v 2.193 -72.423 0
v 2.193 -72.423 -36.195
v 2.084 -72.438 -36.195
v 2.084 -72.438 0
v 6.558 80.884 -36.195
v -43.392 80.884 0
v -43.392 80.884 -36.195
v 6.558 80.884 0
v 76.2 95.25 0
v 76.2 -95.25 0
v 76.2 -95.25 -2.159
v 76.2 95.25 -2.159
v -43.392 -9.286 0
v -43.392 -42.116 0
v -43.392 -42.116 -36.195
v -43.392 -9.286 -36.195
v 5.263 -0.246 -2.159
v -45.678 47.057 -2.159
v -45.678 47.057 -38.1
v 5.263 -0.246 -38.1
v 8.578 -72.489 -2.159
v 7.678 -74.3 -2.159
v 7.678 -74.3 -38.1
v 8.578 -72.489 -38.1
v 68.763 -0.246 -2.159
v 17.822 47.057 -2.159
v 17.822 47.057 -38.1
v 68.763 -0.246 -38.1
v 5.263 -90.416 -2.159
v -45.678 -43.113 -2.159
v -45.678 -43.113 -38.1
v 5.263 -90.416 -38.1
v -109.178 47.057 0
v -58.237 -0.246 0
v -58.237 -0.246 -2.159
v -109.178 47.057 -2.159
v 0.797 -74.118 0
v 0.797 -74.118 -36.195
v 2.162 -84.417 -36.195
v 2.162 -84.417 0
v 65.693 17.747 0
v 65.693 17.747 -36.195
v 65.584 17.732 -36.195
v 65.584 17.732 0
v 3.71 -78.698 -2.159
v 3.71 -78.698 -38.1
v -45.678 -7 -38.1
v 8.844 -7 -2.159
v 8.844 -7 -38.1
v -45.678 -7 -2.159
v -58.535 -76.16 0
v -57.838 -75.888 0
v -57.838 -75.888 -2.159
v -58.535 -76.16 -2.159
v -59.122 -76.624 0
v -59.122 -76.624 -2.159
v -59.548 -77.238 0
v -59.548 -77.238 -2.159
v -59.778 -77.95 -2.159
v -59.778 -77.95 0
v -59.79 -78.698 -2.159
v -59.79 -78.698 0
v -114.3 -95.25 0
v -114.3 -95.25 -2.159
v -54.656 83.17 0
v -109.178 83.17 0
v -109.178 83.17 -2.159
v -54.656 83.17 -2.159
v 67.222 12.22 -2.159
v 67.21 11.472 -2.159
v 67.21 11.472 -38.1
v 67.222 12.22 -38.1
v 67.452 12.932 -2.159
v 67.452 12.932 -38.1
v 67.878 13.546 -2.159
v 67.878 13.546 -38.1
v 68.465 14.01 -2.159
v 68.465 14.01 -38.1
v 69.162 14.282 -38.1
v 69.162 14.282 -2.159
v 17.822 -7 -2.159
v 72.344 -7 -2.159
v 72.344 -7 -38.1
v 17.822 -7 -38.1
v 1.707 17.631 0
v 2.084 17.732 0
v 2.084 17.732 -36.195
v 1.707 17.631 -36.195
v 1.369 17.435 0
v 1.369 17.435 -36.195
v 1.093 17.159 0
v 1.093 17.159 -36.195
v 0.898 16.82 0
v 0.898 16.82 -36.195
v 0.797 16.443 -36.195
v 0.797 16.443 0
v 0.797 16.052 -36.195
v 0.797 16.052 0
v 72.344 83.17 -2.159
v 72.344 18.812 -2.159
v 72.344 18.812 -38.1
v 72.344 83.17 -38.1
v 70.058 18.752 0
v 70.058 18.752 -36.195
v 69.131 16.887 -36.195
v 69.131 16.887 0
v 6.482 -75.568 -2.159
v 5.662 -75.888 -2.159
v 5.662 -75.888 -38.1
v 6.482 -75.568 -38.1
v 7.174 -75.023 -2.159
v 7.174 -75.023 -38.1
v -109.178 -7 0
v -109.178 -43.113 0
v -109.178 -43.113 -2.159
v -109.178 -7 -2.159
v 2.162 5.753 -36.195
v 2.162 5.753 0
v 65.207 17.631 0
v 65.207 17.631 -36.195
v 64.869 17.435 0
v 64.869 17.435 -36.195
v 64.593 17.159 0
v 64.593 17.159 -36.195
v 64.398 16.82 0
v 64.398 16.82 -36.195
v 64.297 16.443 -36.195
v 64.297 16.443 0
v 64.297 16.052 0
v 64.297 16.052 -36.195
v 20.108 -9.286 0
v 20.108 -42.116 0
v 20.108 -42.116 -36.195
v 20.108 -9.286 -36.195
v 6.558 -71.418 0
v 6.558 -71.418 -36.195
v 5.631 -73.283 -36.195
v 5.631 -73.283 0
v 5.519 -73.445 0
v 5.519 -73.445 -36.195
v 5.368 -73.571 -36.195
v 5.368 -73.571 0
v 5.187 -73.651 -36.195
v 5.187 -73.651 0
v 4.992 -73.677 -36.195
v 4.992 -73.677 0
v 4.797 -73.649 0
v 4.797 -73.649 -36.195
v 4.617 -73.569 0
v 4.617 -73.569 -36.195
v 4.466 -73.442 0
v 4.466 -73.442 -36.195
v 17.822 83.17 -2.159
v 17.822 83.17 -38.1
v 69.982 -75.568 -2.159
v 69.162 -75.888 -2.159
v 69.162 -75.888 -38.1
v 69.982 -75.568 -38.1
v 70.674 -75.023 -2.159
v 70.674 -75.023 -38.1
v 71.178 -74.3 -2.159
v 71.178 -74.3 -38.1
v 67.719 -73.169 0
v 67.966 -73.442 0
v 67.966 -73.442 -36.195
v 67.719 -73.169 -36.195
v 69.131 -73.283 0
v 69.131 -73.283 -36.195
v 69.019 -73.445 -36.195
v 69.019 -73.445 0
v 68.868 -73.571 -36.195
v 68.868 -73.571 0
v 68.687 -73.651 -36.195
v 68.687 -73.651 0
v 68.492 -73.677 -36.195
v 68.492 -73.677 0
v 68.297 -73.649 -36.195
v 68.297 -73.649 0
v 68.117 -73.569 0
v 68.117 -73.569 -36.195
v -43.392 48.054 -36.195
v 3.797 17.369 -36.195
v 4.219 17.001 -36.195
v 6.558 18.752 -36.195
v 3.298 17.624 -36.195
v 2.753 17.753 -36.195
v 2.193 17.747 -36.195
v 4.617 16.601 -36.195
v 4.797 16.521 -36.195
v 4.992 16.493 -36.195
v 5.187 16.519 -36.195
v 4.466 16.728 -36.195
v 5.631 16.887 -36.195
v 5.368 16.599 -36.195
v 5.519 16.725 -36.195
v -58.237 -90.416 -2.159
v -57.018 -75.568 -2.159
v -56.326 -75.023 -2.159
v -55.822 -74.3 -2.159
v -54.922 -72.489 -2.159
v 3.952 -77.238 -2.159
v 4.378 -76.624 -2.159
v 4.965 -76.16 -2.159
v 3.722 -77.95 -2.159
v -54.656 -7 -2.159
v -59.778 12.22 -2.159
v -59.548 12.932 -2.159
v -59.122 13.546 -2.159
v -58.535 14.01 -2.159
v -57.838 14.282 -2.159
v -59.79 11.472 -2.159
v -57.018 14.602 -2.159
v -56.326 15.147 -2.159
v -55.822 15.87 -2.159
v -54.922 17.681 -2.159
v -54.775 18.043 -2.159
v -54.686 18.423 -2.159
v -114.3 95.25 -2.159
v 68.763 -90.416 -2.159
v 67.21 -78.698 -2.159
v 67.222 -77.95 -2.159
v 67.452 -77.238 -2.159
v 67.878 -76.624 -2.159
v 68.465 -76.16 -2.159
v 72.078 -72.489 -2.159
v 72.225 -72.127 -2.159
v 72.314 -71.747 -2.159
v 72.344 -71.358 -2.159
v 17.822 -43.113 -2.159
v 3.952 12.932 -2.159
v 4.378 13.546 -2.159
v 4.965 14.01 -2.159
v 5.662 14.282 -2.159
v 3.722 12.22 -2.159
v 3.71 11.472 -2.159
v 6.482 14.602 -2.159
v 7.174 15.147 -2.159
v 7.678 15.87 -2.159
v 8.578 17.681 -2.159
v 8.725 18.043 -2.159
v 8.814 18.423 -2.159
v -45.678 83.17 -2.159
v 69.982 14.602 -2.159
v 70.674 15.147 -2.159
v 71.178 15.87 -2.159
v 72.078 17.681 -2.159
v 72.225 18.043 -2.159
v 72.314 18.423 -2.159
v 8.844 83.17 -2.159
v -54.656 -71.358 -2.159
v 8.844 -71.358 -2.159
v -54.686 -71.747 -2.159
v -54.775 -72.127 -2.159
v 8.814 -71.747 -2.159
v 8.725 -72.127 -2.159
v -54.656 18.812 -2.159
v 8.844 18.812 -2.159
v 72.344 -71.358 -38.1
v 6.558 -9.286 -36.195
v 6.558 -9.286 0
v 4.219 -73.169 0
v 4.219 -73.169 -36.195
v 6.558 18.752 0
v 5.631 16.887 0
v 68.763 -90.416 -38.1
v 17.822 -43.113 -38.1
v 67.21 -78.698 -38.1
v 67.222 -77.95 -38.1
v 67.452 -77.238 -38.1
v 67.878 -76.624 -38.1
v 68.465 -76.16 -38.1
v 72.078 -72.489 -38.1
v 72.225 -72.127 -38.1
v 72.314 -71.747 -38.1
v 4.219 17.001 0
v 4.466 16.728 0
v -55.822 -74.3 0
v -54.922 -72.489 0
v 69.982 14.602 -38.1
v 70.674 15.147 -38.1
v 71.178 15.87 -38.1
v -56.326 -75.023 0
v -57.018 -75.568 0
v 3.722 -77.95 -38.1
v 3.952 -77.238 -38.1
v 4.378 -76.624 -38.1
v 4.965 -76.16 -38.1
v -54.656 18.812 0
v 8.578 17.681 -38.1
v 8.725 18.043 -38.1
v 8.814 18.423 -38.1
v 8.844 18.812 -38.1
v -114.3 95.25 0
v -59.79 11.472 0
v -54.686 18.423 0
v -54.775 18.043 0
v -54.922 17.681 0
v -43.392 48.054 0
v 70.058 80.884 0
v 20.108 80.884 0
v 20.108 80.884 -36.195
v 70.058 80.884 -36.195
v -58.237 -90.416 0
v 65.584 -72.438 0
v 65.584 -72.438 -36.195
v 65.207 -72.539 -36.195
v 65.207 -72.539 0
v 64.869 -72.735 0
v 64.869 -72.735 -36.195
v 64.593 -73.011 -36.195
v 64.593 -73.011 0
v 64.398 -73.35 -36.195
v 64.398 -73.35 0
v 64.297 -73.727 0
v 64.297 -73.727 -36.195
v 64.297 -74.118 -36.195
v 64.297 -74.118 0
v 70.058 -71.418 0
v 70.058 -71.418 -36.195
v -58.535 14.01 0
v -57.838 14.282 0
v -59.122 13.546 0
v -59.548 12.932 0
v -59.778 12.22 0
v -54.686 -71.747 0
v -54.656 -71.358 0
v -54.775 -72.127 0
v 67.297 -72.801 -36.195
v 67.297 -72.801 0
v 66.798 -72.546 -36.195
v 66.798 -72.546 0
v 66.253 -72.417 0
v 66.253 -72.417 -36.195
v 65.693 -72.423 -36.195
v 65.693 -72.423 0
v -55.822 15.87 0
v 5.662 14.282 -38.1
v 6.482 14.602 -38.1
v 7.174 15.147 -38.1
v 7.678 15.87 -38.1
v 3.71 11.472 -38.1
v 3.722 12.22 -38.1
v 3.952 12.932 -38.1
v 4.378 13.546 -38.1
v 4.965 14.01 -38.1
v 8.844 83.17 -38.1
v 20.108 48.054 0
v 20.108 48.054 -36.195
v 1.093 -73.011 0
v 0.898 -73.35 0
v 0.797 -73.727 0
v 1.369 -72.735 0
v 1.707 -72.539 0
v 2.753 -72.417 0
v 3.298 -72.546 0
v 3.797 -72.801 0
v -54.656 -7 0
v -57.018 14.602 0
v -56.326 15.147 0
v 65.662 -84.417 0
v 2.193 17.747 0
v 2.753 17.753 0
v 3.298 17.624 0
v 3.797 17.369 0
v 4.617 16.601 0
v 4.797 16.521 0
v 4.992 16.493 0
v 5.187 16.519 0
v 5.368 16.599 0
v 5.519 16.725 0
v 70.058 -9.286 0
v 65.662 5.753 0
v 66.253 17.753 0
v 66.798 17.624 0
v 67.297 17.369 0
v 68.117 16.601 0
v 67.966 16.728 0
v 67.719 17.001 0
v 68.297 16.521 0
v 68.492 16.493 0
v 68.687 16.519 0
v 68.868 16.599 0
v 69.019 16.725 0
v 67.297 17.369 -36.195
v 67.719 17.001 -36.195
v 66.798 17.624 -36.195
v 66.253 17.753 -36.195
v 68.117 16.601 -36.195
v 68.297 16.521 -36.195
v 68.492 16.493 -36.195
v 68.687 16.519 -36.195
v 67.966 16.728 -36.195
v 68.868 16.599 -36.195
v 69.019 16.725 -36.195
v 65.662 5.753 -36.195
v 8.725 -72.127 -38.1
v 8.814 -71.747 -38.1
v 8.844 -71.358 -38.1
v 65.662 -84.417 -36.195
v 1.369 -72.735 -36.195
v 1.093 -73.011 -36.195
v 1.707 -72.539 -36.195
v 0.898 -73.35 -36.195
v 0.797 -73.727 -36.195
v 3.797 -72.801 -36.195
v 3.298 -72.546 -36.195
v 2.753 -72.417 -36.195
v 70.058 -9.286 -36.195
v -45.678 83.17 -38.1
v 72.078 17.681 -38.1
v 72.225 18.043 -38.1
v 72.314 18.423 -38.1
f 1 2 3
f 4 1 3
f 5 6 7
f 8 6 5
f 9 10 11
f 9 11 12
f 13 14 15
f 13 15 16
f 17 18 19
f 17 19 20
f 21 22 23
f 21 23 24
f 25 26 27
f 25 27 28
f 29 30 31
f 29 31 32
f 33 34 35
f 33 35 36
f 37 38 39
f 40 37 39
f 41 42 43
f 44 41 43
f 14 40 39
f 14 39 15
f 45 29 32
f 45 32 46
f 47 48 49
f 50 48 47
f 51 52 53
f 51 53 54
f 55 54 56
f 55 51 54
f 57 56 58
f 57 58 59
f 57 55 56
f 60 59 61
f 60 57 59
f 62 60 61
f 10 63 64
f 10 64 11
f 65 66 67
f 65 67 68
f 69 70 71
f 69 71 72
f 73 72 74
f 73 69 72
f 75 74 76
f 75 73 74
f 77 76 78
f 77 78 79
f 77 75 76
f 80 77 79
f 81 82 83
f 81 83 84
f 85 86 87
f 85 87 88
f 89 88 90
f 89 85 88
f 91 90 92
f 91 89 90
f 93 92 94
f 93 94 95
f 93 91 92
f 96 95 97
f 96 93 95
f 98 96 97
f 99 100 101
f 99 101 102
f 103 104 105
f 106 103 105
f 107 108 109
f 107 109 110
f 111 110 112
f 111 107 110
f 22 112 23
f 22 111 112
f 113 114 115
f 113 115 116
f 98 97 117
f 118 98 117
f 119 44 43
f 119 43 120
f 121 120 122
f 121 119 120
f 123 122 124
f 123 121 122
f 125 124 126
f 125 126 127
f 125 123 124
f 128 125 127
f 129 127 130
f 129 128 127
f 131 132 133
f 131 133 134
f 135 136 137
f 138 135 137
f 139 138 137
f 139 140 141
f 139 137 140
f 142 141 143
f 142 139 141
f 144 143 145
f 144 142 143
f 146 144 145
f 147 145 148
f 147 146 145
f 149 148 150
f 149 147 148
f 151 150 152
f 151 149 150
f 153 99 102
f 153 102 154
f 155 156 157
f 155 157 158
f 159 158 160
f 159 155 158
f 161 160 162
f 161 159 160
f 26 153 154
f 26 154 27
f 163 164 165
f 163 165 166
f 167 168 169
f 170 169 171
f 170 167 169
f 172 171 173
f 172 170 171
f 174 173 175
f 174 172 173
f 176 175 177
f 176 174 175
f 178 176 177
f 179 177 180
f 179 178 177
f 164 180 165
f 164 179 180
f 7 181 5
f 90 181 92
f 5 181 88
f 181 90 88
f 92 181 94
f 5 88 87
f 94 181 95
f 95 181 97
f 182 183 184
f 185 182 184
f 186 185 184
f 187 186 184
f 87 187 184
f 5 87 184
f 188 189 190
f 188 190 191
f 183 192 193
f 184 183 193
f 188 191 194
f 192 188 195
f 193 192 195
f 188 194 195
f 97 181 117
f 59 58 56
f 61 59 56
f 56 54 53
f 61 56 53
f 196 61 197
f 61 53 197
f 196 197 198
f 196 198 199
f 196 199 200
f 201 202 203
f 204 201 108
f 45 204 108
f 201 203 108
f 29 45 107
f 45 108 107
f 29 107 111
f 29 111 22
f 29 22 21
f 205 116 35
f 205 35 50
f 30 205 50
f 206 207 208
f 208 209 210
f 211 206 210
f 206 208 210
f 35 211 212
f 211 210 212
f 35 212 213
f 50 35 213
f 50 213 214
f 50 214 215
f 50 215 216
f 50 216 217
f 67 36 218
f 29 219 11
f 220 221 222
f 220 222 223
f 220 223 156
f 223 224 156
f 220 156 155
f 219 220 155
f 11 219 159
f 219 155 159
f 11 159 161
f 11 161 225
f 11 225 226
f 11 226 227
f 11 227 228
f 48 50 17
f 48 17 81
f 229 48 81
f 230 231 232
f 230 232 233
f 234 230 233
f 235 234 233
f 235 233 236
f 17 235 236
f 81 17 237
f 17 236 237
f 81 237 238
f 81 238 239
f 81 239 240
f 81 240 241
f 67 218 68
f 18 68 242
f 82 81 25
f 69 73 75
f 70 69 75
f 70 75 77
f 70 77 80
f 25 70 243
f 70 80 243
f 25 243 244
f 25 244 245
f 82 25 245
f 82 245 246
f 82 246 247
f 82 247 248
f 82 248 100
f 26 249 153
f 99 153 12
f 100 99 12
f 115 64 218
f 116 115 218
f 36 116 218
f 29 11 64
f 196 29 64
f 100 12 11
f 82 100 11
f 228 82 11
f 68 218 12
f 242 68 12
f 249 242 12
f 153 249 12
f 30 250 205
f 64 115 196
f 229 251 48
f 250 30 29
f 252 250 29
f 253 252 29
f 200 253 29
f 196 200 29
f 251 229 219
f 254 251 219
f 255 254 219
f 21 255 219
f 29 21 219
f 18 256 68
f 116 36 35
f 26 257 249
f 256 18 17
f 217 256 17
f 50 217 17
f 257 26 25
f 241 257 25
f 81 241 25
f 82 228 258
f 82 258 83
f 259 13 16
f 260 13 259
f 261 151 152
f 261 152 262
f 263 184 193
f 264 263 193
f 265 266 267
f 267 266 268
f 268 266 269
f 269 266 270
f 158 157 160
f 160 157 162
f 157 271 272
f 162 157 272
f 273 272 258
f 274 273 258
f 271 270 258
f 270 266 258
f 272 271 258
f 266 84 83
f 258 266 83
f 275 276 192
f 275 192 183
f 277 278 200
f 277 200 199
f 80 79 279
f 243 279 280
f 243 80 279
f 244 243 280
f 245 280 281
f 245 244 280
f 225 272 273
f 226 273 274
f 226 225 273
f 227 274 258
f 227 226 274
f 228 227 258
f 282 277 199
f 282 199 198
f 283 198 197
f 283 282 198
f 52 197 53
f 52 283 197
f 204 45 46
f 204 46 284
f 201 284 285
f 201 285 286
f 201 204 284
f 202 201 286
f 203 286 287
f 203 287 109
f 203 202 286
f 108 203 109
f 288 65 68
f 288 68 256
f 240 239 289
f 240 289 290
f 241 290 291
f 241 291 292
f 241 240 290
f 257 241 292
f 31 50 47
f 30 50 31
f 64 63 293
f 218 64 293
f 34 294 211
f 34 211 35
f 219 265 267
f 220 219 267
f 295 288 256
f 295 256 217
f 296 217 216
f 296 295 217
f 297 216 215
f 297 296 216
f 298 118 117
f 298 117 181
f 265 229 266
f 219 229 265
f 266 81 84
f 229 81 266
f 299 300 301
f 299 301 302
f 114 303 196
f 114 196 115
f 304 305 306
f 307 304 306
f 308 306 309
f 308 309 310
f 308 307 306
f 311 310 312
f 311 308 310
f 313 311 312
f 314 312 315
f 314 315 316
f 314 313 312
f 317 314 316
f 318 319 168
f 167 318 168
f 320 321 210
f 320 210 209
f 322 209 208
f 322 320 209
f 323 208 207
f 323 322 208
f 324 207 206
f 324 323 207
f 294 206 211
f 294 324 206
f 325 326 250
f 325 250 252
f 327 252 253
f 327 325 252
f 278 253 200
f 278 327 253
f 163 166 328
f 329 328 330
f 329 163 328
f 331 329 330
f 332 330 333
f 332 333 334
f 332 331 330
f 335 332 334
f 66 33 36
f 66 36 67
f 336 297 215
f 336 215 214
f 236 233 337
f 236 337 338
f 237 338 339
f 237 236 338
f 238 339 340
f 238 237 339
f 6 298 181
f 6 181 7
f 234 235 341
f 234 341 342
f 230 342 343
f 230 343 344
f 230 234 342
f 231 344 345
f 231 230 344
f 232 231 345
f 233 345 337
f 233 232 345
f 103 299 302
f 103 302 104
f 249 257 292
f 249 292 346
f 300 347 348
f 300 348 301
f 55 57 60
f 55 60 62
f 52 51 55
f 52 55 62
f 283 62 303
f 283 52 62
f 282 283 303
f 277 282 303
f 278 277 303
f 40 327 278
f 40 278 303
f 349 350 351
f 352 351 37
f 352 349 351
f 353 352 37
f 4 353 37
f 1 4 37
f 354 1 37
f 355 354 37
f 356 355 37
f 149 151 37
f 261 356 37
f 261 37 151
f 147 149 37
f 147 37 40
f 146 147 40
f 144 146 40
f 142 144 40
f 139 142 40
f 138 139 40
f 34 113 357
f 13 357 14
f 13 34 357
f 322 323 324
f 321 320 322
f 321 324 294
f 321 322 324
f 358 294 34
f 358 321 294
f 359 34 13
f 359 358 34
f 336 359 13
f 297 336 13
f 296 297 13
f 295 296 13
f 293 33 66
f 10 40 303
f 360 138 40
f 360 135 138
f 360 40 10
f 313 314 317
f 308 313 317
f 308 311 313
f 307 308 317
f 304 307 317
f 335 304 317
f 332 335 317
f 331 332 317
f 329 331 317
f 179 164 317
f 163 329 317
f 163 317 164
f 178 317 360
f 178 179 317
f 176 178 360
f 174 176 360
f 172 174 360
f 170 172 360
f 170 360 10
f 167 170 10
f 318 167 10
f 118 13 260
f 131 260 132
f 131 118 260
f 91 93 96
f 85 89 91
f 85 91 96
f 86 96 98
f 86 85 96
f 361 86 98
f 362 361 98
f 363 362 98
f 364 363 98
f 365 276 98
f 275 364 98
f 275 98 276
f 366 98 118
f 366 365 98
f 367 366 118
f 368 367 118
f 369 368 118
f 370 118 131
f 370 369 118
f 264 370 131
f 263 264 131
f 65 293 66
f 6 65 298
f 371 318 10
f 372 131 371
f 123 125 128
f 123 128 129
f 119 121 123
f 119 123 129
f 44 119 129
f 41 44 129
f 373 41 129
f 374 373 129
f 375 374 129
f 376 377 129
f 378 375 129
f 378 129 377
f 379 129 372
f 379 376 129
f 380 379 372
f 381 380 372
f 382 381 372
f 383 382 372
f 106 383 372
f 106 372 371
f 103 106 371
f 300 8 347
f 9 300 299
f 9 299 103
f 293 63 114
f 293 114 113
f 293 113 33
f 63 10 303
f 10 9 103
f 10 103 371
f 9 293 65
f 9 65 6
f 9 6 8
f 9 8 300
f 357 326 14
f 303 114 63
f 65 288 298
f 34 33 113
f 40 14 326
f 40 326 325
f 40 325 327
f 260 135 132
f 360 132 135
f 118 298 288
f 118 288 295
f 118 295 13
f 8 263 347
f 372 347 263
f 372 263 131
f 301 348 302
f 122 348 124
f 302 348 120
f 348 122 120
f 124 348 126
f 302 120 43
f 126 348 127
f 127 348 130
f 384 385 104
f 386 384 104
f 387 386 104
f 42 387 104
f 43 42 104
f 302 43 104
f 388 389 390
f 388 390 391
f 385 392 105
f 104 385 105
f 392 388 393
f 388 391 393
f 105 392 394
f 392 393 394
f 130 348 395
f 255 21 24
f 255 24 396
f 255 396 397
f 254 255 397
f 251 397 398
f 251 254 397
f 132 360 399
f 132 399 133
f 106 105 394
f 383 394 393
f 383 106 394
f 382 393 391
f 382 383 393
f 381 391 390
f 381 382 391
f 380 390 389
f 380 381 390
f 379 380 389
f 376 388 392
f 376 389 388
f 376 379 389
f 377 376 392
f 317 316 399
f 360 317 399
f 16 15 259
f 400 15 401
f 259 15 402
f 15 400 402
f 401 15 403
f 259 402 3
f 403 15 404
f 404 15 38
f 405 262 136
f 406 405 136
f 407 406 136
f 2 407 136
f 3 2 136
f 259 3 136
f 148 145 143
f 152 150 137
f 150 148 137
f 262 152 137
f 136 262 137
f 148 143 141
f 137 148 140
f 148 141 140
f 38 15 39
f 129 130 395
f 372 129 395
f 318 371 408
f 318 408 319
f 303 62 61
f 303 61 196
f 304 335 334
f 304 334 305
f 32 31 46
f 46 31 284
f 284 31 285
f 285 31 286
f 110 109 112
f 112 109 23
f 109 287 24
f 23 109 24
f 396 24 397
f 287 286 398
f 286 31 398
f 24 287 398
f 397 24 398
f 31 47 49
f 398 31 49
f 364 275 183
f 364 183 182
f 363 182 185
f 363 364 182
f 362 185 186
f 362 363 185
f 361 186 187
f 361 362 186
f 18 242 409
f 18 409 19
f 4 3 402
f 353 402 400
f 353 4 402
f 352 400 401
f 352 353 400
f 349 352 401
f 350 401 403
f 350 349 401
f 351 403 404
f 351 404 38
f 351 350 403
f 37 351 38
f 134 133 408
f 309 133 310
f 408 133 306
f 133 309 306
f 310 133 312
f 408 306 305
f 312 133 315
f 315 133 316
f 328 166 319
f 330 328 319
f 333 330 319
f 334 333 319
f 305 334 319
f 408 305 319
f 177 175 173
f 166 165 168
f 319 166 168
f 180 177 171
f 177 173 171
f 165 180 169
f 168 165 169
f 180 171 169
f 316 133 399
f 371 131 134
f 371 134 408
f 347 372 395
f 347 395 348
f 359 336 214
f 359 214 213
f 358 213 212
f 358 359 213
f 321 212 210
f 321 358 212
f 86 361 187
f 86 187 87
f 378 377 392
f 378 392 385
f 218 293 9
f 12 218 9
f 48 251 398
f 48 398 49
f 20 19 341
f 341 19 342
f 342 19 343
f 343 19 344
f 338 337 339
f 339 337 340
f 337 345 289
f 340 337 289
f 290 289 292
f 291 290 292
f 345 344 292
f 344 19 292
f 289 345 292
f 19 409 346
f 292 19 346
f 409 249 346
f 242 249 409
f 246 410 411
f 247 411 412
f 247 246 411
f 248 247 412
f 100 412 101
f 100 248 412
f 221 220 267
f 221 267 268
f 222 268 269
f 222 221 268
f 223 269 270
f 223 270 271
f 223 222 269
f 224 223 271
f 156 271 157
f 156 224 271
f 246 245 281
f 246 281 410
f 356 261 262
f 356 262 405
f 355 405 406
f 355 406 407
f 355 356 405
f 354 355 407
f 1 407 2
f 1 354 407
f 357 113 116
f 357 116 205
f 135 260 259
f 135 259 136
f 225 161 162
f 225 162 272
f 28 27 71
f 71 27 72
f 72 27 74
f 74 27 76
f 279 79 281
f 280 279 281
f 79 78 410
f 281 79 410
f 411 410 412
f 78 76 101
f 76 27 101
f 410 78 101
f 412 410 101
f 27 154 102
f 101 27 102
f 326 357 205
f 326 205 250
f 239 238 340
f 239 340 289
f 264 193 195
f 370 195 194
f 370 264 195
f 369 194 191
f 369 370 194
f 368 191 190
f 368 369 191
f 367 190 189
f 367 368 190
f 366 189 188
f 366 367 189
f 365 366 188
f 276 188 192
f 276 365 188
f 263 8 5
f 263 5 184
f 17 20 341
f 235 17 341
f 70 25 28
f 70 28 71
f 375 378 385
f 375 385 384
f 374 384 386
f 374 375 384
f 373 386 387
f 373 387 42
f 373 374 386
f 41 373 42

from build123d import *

# Parameters (mm, degrees)
F1_DEPTH = 38.1
F0_W     = 190.5
F0_H     = 190.5
F2_DEPTH = 2.159
F5_DEPTH = 1.905


with BuildPart() as f1:
    # F0 (on Top) → F1 (new body)
    with BuildSketch(Plane.XY):
        with BuildLine():
            ThreePointArc((72.0782338403, -72.4890221543), (72.2764898364, -71.9390746235), (72.3437630109, -71.358366395))
            Line((72.3437630109, -71.358366395), (72.3437630109, -6.9999878642))
            Line((72.3437630109, -6.9999878642), (17.8223712996, -6.9999878642))
            Line((17.8223712996, -6.9999878642), (17.8223712996, -43.112684))
            Line((17.8223712996, -43.112684), (68.7632503296, -90.4163775524))
            Line((68.7632503296, -90.4163775524), (67.2103853279, -78.6976437184))
            ThreePointArc((67.2103853279, -78.6976437184), (67.642280367, -76.9149091055), (69.1621273878, -75.8879032349))
            ThreePointArc((69.1621273878, -75.8879032349), (70.34845738, -75.3207077832), (71.1778330484, -74.3003031911))
            Line((71.1778330484, -74.3003031911), (72.0782338403, -72.4890221543))
        make_face()
        with BuildLine():
            Line((65.6623095274, -84.4172274415), (20.1083738357, -42.115848763))
            Line((20.1083738357, -42.115848763), (20.1083738357, -9.2859904003))
            Line((20.1083738357, -9.2859904003), (70.0577604748, -9.2859904003))
            Line((70.0577604748, -9.2859904003), (70.0577604748, -71.418016501))
            Line((70.0577604748, -71.418016501), (69.1308070309, -73.2827118787))
            ThreePointArc((69.1308070309, -73.2827118787), (68.5904715317, -73.6707487579), (67.9656927684, -73.4423049611))
            Line((67.9656927684, -73.4423049611), (67.7194629988, -73.1691417889))
            ThreePointArc((67.7194629988, -73.1691417889), (66.7984934635, -72.5458506783), (65.6932154198, -72.4232246633))
            Line((65.6932154198, -72.4232246633), (65.5843092936, -72.4376559588))
            ThreePointArc((65.5843092936, -72.4376559588), (64.5929725961, -73.0111207367), (64.297492528, -74.1176024711))
            Line((64.297492528, -74.1176024711), (65.6623095274, -84.4172274415))
        make_face(mode=Mode.SUBTRACT)
    extrude(amount=-F1_DEPTH)



with BuildPart() as f1b:
    # F0 (on Top) → F1, piece 2 (new body)
    with BuildSketch(Plane.XY):
        with BuildLine():
            Line((17.8223712996, 83.1700121358), (17.8223712996, 47.057316))
            Line((17.8223712996, 47.057316), (68.7632503296, -0.2463775524))
            Line((68.7632503296, -0.2463775524), (67.2103853279, 11.4723562816))
            ThreePointArc((67.2103853279, 11.4723562816), (67.642280367, 13.2550908945), (69.1621273878, 14.2820967651))
            ThreePointArc((69.1621273878, 14.2820967651), (70.34845738, 14.8492922168), (71.1778330484, 15.8696968089))
            Line((71.1778330484, 15.8696968089), (72.0782338403, 17.6809778457))
            ThreePointArc((72.0782338403, 17.6809778457), (72.2764898364, 18.2309253765), (72.3437630109, 18.811633605))
            Line((72.3437630109, 18.811633605), (72.3437630109, 83.1700121358))
            Line((72.3437630109, 83.1700121358), (17.8223712996, 83.1700121358))
        make_face()
        with BuildLine():
            Line((20.1083738357, 48.054151237), (20.1083738357, 80.8840095997))
            Line((20.1083738357, 80.8840095997), (70.0577604748, 80.8840095997))
            Line((70.0577604748, 80.8840095997), (70.0577604748, 18.751983499))
            Line((70.0577604748, 18.751983499), (69.1308070309, 16.8872881213))
            ThreePointArc((69.1308070309, 16.8872881213), (68.5904715317, 16.4992512421), (67.9656927684, 16.7276950389))
            Line((67.9656927684, 16.7276950389), (67.7194629988, 17.0008582111))
            ThreePointArc((67.7194629988, 17.0008582111), (66.7984934635, 17.6241493217), (65.6932154198, 17.7467753367))
            Line((65.6932154198, 17.7467753367), (65.5843092936, 17.7323440412))
            ThreePointArc((65.5843092936, 17.7323440412), (64.5929725961, 17.1588792633), (64.297492528, 16.0523975289))
            Line((64.297492528, 16.0523975289), (65.6623095274, 5.7527725585))
            Line((65.6623095274, 5.7527725585), (20.1083738357, 48.054151237))
        make_face(mode=Mode.SUBTRACT)
    extrude(amount=-F1_DEPTH)


with BuildPart() as f1c:
    # F0 (on Top) → F1, piece 3 (new body)
    with BuildSketch(Plane.XY):
        with BuildLine():
            ThreePointArc((8.5782338403, 17.6809778457), (8.7764898364, 18.2309253765), (8.8437630109, 18.811633605))
            Line((8.8437630109, 18.811633605), (8.8437630109, 83.1700121358))
            Line((8.8437630109, 83.1700121358), (-45.6776287004, 83.1700121358))
            Line((-45.6776287004, 83.1700121358), (-45.6776287004, 47.057316))
            Line((-45.6776287004, 47.057316), (5.2632503296, -0.2463775524))
            Line((5.2632503296, -0.2463775524), (3.7103853279, 11.4723562816))
            ThreePointArc((3.7103853279, 11.4723562816), (4.142280367, 13.2550908945), (5.6621273878, 14.2820967651))
            ThreePointArc((5.6621273878, 14.2820967651), (6.84845738, 14.8492922168), (7.6778330484, 15.8696968089))
            Line((7.6778330484, 15.8696968089), (8.5782338403, 17.6809778457))
        make_face()
        with BuildLine():
            Line((2.1623095274, 5.7527725585), (-43.3916261643, 48.054151237))
            Line((-43.3916261643, 48.054151237), (-43.3916261643, 80.8840095997))
            Line((-43.3916261643, 80.8840095997), (6.5577604748, 80.8840095997))
            Line((6.5577604748, 80.8840095997), (6.5577604748, 18.751983499))
            Line((6.5577604748, 18.751983499), (5.6308070309, 16.8872881213))
            ThreePointArc((5.6308070309, 16.8872881213), (5.0904715317, 16.4992512421), (4.4656927684, 16.7276950389))
            Line((4.4656927684, 16.7276950389), (4.2194629988, 17.0008582111))
            ThreePointArc((4.2194629988, 17.0008582111), (3.2984934635, 17.6241493217), (2.1932154198, 17.7467753367))
            Line((2.1932154198, 17.7467753367), (2.0843092936, 17.7323440412))
            ThreePointArc((2.0843092936, 17.7323440412), (1.0929725961, 17.1588792633), (0.797492528, 16.0523975289))
            Line((0.797492528, 16.0523975289), (2.1623095274, 5.7527725585))
        make_face(mode=Mode.SUBTRACT)
    extrude(amount=-F1_DEPTH)


with BuildPart() as f1d:
    # F0 (on Top) → F1, piece 4 (new body)
    with BuildSketch(Plane.XY):
        with BuildLine():
            ThreePointArc((8.5782338403, -72.4890221543), (8.7764898364, -71.9390746235), (8.8437630109, -71.358366395))
            Line((8.8437630109, -71.358366395), (8.8437630109, -6.9999878642))
            Line((8.8437630109, -6.9999878642), (-45.6776287004, -6.9999878642))
            Line((-45.6776287004, -6.9999878642), (-45.6776287004, -43.112684))
            Line((-45.6776287004, -43.112684), (5.2632503296, -90.4163775524))
            Line((5.2632503296, -90.4163775524), (3.7103853279, -78.6976437184))
            ThreePointArc((3.7103853279, -78.6976437184), (4.142280367, -76.9149091055), (5.6621273878, -75.8879032349))
            ThreePointArc((5.6621273878, -75.8879032349), (6.84845738, -75.3207077832), (7.6778330484, -74.3003031911))
            Line((7.6778330484, -74.3003031911), (8.5782338403, -72.4890221543))
        make_face()
        with BuildLine():
            Line((2.1623095274, -84.4172274415), (-43.3916261643, -42.115848763))
            Line((-43.3916261643, -42.115848763), (-43.3916261643, -9.2859904003))
            Line((-43.3916261643, -9.2859904003), (6.5577604748, -9.2859904003))
            Line((6.5577604748, -9.2859904003), (6.5577604748, -71.418016501))
            Line((6.5577604748, -71.418016501), (5.6308070309, -73.2827118787))
            ThreePointArc((5.6308070309, -73.2827118787), (5.0904715317, -73.6707487579), (4.4656927684, -73.4423049611))
            Line((4.4656927684, -73.4423049611), (4.2194629988, -73.1691417889))
            ThreePointArc((4.2194629988, -73.1691417889), (3.2984934635, -72.5458506783), (2.1932154198, -72.4232246633))
            Line((2.1932154198, -72.4232246633), (2.0843092936, -72.4376559588))
            ThreePointArc((2.0843092936, -72.4376559588), (1.0929725961, -73.0111207367), (0.797492528, -74.1176024711))
            Line((0.797492528, -74.1176024711), (2.1623095274, -84.4172274415))
        make_face(mode=Mode.SUBTRACT)
    extrude(amount=-F1_DEPTH)


with BuildPart() as f1_1:
    add(f1.part)

    add(f1b.part)  # F2 merges F1b

    add(f1c.part)  # F2 merges F1c

    add(f1d.part)  # F2 merges F1d
    # F0 (on Top) → F2 (join)
    with BuildSketch(Plane.XY):
        with Locations((-19.05, 0)):
            Rectangle(F0_W, F0_H)
        with BuildLine():
            Line((-54.6562369891, -6.9999878642), (-54.6562369891, -71.358366395))
            ThreePointArc((-54.6562369891, -71.358366395), (-54.7235101636, -71.9390746235), (-54.9217661597, -72.4890221543))
            Line((-54.9217661597, -72.4890221543), (-55.8221669516, -74.3003031911))
            ThreePointArc((-55.8221669516, -74.3003031911), (-56.65154262, -75.3207077832), (-57.8378726122, -75.8879032349))
            ThreePointArc((-57.8378726122, -75.8879032349), (-59.357719633, -76.9149091055), (-59.7896146721, -78.6976437184))
            Line((-59.7896146721, -78.6976437184), (-58.2367496704, -90.4163775524))
            Line((-58.2367496704, -90.4163775524), (-109.1776287004, -43.112684))
            Line((-109.1776287004, -43.112684), (-109.1776287004, -6.9999878642))
            Line((-109.1776287004, -6.9999878642), (-54.6562369891, -6.9999878642))
        make_face(mode=Mode.SUBTRACT)
        with BuildLine():
            Line((8.8437630109, -6.9999878642), (8.8437630109, -71.358366395))
            ThreePointArc((8.8437630109, -71.358366395), (8.7764898364, -71.9390746235), (8.5782338403, -72.4890221543))
            Line((8.5782338403, -72.4890221543), (7.6778330484, -74.3003031911))
            ThreePointArc((7.6778330484, -74.3003031911), (6.84845738, -75.3207077832), (5.6621273878, -75.8879032349))
            ThreePointArc((5.6621273878, -75.8879032349), (4.142280367, -76.9149091055), (3.7103853279, -78.6976437184))
            Line((3.7103853279, -78.6976437184), (5.2632503296, -90.4163775524))
            Line((5.2632503296, -90.4163775524), (-45.6776287004, -43.112684))
            Line((-45.6776287004, -43.112684), (-45.6776287004, -6.9999878642))
            Line((-45.6776287004, -6.9999878642), (8.8437630109, -6.9999878642))
        make_face(mode=Mode.SUBTRACT)
        with BuildLine():
            Line((72.3437630109, -6.9999878642), (72.3437630109, -71.358366395))
            ThreePointArc((72.3437630109, -71.358366395), (72.2764898364, -71.9390746235), (72.0782338403, -72.4890221543))
            Line((72.0782338403, -72.4890221543), (71.1778330484, -74.3003031911))
            ThreePointArc((71.1778330484, -74.3003031911), (70.34845738, -75.3207077832), (69.1621273878, -75.8879032349))
            ThreePointArc((69.1621273878, -75.8879032349), (67.642280367, -76.9149091055), (67.2103853279, -78.6976437184))
            Line((67.2103853279, -78.6976437184), (68.7632503296, -90.4163775524))
            Line((68.7632503296, -90.4163775524), (17.8223712996, -43.112684))
            Line((17.8223712996, -43.112684), (17.8223712996, -6.9999878642))
            Line((17.8223712996, -6.9999878642), (72.3437630109, -6.9999878642))
        make_face(mode=Mode.SUBTRACT)
        with BuildLine():
            Line((-54.6562369891, 83.1700121358), (-54.6562369891, 18.811633605))
            ThreePointArc((-54.6562369891, 18.811633605), (-54.7235101636, 18.2309253765), (-54.9217661597, 17.6809778457))
            Line((-54.9217661597, 17.6809778457), (-55.8221669516, 15.8696968089))
            ThreePointArc((-55.8221669516, 15.8696968089), (-56.65154262, 14.8492922168), (-57.8378726122, 14.2820967651))
            ThreePointArc((-57.8378726122, 14.2820967651), (-59.357719633, 13.2550908945), (-59.7896146721, 11.4723562816))
            Line((-59.7896146721, 11.4723562816), (-58.2367496704, -0.2463775524))
            Line((-58.2367496704, -0.2463775524), (-109.1776287004, 47.057316))
            Line((-109.1776287004, 47.057316), (-109.1776287004, 83.1700121358))
            Line((-109.1776287004, 83.1700121358), (-54.6562369891, 83.1700121358))
        make_face(mode=Mode.SUBTRACT)
        with BuildLine():
            Line((8.8437630109, 83.1700121358), (8.8437630109, 18.811633605))
            ThreePointArc((8.8437630109, 18.811633605), (8.7764898364, 18.2309253765), (8.5782338403, 17.6809778457))
            Line((8.5782338403, 17.6809778457), (7.6778330484, 15.8696968089))
            ThreePointArc((7.6778330484, 15.8696968089), (6.84845738, 14.8492922168), (5.6621273878, 14.2820967651))
            ThreePointArc((5.6621273878, 14.2820967651), (4.142280367, 13.2550908945), (3.7103853279, 11.4723562816))
            Line((3.7103853279, 11.4723562816), (5.2632503296, -0.2463775524))
            Line((5.2632503296, -0.2463775524), (-45.6776287004, 47.057316))
            Line((-45.6776287004, 47.057316), (-45.6776287004, 83.1700121358))
            Line((-45.6776287004, 83.1700121358), (8.8437630109, 83.1700121358))
        make_face(mode=Mode.SUBTRACT)
        with BuildLine():
            Line((68.7632503296, -0.2463775524), (17.8223712996, 47.057316))
            Line((17.8223712996, 47.057316), (17.8223712996, 83.1700121358))
            Line((17.8223712996, 83.1700121358), (72.3437630109, 83.1700121358))
            Line((72.3437630109, 83.1700121358), (72.3437630109, 18.811633605))
            ThreePointArc((72.3437630109, 18.811633605), (72.2764898364, 18.2309253765), (72.0782338403, 17.6809778457))
            Line((72.0782338403, 17.6809778457), (71.1778330484, 15.8696968089))
            ThreePointArc((71.1778330484, 15.8696968089), (70.34845738, 14.8492922168), (69.1621273878, 14.2820967651))
            ThreePointArc((69.1621273878, 14.2820967651), (67.642280367, 13.2550908945), (67.2103853279, 11.4723562816))
            Line((67.2103853279, 11.4723562816), (68.7632503296, -0.2463775524))
        make_face(mode=Mode.SUBTRACT)
    extrude(amount=-F2_DEPTH)

    # F4 (on offset) → F5 (join)
    with BuildSketch(Plane(origin=(0, 0, -38.1), x_dir=(1, 0, 0), z_dir=(0, 0, -1))):
        with BuildLine():
            ThreePointArc((72.3437630109, -18.811633605), (72.2764898364, -18.2309253765), (72.0782338403, -17.6809778457))
            Line((72.0782338403, -17.6809778457), (71.1778330484, -15.8696968089))
            ThreePointArc((71.1778330484, -15.8696968089), (70.34845738, -14.8492922168), (69.1621273878, -14.2820967651))
            ThreePointArc((69.1621273878, -14.2820967651), (67.642280367, -13.2550908945), (67.2103853279, -11.4723562816))
            Line((67.2103853279, -11.4723562816), (68.7632503296, 0.2463775524))
            Line((68.7632503296, 0.2463775524), (17.8223712996, -47.057316))
            Line((17.8223712996, -47.057316), (17.8223712996, -83.1700121358))
            Line((17.8223712996, -83.1700121358), (72.3437630109, -83.1700121358))
            Line((72.3437630109, -83.1700121358), (72.3437630109, -18.811633605))
        make_face()
        with BuildLine():
            ThreePointArc((7.6778330484, -15.8696968089), (6.84845738, -14.8492922168), (5.6621273878, -14.2820967651))
            ThreePointArc((5.6621273878, -14.2820967651), (4.142280367, -13.2550908945), (3.7103853279, -11.4723562816))
            Line((3.7103853279, -11.4723562816), (5.2632503296, 0.2463775524))
            Line((5.2632503296, 0.2463775524), (-45.6776287004, -47.057316))
            Line((-45.6776287004, -47.057316), (-45.6776287004, -83.1700121358))
            Line((-45.6776287004, -83.1700121358), (8.8437630109, -83.1700121358))
            Line((8.8437630109, -83.1700121358), (8.8437630109, -18.811633605))
            ThreePointArc((8.8437630109, -18.811633605), (8.7764898364, -18.2309253765), (8.5782338403, -17.6809778457))
            Line((8.5782338403, -17.6809778457), (7.6778330484, -15.8696968089))
        make_face()
        with BuildLine():
            ThreePointArc((71.1778330484, 74.3003031911), (70.34845738, 75.3207077832), (69.1621273878, 75.8879032349))
            ThreePointArc((69.1621273878, 75.8879032349), (67.642280367, 76.9149091055), (67.2103853279, 78.6976437184))
            Line((67.2103853279, 78.6976437184), (68.7632503296, 90.4163775524))
            Line((68.7632503296, 90.4163775524), (17.8223712996, 43.112684))
            Line((17.8223712996, 43.112684), (17.8223712996, 6.9999878642))
            Line((17.8223712996, 6.9999878642), (72.3437630109, 6.9999878642))
            Line((72.3437630109, 6.9999878642), (72.3437630109, 71.358366395))
            ThreePointArc((72.3437630109, 71.358366395), (72.2764898364, 71.9390746235), (72.0782338403, 72.4890221543))
            Line((72.0782338403, 72.4890221543), (71.1778330484, 74.3003031911))
        make_face()
        with BuildLine():
            ThreePointArc((7.6778330484, 74.3003031911), (6.84845738, 75.3207077832), (5.6621273878, 75.8879032349))
            ThreePointArc((5.6621273878, 75.8879032349), (4.142280367, 76.9149091055), (3.7103853279, 78.6976437184))
            Line((3.7103853279, 78.6976437184), (5.2632503296, 90.4163775524))
            Line((5.2632503296, 90.4163775524), (-45.6776287004, 43.112684))
            Line((-45.6776287004, 43.112684), (-45.6776287004, 6.9999878642))
            Line((-45.6776287004, 6.9999878642), (8.8437630109, 6.9999878642))
            Line((8.8437630109, 6.9999878642), (8.8437630109, 71.358366395))
            ThreePointArc((8.8437630109, 71.358366395), (8.7764898364, 71.9390746235), (8.5782338403, 72.4890221543))
            Line((8.5782338403, 72.4890221543), (7.6778330484, 74.3003031911))
        make_face()
    extrude(amount=-F5_DEPTH)


solid = f1_1.part
